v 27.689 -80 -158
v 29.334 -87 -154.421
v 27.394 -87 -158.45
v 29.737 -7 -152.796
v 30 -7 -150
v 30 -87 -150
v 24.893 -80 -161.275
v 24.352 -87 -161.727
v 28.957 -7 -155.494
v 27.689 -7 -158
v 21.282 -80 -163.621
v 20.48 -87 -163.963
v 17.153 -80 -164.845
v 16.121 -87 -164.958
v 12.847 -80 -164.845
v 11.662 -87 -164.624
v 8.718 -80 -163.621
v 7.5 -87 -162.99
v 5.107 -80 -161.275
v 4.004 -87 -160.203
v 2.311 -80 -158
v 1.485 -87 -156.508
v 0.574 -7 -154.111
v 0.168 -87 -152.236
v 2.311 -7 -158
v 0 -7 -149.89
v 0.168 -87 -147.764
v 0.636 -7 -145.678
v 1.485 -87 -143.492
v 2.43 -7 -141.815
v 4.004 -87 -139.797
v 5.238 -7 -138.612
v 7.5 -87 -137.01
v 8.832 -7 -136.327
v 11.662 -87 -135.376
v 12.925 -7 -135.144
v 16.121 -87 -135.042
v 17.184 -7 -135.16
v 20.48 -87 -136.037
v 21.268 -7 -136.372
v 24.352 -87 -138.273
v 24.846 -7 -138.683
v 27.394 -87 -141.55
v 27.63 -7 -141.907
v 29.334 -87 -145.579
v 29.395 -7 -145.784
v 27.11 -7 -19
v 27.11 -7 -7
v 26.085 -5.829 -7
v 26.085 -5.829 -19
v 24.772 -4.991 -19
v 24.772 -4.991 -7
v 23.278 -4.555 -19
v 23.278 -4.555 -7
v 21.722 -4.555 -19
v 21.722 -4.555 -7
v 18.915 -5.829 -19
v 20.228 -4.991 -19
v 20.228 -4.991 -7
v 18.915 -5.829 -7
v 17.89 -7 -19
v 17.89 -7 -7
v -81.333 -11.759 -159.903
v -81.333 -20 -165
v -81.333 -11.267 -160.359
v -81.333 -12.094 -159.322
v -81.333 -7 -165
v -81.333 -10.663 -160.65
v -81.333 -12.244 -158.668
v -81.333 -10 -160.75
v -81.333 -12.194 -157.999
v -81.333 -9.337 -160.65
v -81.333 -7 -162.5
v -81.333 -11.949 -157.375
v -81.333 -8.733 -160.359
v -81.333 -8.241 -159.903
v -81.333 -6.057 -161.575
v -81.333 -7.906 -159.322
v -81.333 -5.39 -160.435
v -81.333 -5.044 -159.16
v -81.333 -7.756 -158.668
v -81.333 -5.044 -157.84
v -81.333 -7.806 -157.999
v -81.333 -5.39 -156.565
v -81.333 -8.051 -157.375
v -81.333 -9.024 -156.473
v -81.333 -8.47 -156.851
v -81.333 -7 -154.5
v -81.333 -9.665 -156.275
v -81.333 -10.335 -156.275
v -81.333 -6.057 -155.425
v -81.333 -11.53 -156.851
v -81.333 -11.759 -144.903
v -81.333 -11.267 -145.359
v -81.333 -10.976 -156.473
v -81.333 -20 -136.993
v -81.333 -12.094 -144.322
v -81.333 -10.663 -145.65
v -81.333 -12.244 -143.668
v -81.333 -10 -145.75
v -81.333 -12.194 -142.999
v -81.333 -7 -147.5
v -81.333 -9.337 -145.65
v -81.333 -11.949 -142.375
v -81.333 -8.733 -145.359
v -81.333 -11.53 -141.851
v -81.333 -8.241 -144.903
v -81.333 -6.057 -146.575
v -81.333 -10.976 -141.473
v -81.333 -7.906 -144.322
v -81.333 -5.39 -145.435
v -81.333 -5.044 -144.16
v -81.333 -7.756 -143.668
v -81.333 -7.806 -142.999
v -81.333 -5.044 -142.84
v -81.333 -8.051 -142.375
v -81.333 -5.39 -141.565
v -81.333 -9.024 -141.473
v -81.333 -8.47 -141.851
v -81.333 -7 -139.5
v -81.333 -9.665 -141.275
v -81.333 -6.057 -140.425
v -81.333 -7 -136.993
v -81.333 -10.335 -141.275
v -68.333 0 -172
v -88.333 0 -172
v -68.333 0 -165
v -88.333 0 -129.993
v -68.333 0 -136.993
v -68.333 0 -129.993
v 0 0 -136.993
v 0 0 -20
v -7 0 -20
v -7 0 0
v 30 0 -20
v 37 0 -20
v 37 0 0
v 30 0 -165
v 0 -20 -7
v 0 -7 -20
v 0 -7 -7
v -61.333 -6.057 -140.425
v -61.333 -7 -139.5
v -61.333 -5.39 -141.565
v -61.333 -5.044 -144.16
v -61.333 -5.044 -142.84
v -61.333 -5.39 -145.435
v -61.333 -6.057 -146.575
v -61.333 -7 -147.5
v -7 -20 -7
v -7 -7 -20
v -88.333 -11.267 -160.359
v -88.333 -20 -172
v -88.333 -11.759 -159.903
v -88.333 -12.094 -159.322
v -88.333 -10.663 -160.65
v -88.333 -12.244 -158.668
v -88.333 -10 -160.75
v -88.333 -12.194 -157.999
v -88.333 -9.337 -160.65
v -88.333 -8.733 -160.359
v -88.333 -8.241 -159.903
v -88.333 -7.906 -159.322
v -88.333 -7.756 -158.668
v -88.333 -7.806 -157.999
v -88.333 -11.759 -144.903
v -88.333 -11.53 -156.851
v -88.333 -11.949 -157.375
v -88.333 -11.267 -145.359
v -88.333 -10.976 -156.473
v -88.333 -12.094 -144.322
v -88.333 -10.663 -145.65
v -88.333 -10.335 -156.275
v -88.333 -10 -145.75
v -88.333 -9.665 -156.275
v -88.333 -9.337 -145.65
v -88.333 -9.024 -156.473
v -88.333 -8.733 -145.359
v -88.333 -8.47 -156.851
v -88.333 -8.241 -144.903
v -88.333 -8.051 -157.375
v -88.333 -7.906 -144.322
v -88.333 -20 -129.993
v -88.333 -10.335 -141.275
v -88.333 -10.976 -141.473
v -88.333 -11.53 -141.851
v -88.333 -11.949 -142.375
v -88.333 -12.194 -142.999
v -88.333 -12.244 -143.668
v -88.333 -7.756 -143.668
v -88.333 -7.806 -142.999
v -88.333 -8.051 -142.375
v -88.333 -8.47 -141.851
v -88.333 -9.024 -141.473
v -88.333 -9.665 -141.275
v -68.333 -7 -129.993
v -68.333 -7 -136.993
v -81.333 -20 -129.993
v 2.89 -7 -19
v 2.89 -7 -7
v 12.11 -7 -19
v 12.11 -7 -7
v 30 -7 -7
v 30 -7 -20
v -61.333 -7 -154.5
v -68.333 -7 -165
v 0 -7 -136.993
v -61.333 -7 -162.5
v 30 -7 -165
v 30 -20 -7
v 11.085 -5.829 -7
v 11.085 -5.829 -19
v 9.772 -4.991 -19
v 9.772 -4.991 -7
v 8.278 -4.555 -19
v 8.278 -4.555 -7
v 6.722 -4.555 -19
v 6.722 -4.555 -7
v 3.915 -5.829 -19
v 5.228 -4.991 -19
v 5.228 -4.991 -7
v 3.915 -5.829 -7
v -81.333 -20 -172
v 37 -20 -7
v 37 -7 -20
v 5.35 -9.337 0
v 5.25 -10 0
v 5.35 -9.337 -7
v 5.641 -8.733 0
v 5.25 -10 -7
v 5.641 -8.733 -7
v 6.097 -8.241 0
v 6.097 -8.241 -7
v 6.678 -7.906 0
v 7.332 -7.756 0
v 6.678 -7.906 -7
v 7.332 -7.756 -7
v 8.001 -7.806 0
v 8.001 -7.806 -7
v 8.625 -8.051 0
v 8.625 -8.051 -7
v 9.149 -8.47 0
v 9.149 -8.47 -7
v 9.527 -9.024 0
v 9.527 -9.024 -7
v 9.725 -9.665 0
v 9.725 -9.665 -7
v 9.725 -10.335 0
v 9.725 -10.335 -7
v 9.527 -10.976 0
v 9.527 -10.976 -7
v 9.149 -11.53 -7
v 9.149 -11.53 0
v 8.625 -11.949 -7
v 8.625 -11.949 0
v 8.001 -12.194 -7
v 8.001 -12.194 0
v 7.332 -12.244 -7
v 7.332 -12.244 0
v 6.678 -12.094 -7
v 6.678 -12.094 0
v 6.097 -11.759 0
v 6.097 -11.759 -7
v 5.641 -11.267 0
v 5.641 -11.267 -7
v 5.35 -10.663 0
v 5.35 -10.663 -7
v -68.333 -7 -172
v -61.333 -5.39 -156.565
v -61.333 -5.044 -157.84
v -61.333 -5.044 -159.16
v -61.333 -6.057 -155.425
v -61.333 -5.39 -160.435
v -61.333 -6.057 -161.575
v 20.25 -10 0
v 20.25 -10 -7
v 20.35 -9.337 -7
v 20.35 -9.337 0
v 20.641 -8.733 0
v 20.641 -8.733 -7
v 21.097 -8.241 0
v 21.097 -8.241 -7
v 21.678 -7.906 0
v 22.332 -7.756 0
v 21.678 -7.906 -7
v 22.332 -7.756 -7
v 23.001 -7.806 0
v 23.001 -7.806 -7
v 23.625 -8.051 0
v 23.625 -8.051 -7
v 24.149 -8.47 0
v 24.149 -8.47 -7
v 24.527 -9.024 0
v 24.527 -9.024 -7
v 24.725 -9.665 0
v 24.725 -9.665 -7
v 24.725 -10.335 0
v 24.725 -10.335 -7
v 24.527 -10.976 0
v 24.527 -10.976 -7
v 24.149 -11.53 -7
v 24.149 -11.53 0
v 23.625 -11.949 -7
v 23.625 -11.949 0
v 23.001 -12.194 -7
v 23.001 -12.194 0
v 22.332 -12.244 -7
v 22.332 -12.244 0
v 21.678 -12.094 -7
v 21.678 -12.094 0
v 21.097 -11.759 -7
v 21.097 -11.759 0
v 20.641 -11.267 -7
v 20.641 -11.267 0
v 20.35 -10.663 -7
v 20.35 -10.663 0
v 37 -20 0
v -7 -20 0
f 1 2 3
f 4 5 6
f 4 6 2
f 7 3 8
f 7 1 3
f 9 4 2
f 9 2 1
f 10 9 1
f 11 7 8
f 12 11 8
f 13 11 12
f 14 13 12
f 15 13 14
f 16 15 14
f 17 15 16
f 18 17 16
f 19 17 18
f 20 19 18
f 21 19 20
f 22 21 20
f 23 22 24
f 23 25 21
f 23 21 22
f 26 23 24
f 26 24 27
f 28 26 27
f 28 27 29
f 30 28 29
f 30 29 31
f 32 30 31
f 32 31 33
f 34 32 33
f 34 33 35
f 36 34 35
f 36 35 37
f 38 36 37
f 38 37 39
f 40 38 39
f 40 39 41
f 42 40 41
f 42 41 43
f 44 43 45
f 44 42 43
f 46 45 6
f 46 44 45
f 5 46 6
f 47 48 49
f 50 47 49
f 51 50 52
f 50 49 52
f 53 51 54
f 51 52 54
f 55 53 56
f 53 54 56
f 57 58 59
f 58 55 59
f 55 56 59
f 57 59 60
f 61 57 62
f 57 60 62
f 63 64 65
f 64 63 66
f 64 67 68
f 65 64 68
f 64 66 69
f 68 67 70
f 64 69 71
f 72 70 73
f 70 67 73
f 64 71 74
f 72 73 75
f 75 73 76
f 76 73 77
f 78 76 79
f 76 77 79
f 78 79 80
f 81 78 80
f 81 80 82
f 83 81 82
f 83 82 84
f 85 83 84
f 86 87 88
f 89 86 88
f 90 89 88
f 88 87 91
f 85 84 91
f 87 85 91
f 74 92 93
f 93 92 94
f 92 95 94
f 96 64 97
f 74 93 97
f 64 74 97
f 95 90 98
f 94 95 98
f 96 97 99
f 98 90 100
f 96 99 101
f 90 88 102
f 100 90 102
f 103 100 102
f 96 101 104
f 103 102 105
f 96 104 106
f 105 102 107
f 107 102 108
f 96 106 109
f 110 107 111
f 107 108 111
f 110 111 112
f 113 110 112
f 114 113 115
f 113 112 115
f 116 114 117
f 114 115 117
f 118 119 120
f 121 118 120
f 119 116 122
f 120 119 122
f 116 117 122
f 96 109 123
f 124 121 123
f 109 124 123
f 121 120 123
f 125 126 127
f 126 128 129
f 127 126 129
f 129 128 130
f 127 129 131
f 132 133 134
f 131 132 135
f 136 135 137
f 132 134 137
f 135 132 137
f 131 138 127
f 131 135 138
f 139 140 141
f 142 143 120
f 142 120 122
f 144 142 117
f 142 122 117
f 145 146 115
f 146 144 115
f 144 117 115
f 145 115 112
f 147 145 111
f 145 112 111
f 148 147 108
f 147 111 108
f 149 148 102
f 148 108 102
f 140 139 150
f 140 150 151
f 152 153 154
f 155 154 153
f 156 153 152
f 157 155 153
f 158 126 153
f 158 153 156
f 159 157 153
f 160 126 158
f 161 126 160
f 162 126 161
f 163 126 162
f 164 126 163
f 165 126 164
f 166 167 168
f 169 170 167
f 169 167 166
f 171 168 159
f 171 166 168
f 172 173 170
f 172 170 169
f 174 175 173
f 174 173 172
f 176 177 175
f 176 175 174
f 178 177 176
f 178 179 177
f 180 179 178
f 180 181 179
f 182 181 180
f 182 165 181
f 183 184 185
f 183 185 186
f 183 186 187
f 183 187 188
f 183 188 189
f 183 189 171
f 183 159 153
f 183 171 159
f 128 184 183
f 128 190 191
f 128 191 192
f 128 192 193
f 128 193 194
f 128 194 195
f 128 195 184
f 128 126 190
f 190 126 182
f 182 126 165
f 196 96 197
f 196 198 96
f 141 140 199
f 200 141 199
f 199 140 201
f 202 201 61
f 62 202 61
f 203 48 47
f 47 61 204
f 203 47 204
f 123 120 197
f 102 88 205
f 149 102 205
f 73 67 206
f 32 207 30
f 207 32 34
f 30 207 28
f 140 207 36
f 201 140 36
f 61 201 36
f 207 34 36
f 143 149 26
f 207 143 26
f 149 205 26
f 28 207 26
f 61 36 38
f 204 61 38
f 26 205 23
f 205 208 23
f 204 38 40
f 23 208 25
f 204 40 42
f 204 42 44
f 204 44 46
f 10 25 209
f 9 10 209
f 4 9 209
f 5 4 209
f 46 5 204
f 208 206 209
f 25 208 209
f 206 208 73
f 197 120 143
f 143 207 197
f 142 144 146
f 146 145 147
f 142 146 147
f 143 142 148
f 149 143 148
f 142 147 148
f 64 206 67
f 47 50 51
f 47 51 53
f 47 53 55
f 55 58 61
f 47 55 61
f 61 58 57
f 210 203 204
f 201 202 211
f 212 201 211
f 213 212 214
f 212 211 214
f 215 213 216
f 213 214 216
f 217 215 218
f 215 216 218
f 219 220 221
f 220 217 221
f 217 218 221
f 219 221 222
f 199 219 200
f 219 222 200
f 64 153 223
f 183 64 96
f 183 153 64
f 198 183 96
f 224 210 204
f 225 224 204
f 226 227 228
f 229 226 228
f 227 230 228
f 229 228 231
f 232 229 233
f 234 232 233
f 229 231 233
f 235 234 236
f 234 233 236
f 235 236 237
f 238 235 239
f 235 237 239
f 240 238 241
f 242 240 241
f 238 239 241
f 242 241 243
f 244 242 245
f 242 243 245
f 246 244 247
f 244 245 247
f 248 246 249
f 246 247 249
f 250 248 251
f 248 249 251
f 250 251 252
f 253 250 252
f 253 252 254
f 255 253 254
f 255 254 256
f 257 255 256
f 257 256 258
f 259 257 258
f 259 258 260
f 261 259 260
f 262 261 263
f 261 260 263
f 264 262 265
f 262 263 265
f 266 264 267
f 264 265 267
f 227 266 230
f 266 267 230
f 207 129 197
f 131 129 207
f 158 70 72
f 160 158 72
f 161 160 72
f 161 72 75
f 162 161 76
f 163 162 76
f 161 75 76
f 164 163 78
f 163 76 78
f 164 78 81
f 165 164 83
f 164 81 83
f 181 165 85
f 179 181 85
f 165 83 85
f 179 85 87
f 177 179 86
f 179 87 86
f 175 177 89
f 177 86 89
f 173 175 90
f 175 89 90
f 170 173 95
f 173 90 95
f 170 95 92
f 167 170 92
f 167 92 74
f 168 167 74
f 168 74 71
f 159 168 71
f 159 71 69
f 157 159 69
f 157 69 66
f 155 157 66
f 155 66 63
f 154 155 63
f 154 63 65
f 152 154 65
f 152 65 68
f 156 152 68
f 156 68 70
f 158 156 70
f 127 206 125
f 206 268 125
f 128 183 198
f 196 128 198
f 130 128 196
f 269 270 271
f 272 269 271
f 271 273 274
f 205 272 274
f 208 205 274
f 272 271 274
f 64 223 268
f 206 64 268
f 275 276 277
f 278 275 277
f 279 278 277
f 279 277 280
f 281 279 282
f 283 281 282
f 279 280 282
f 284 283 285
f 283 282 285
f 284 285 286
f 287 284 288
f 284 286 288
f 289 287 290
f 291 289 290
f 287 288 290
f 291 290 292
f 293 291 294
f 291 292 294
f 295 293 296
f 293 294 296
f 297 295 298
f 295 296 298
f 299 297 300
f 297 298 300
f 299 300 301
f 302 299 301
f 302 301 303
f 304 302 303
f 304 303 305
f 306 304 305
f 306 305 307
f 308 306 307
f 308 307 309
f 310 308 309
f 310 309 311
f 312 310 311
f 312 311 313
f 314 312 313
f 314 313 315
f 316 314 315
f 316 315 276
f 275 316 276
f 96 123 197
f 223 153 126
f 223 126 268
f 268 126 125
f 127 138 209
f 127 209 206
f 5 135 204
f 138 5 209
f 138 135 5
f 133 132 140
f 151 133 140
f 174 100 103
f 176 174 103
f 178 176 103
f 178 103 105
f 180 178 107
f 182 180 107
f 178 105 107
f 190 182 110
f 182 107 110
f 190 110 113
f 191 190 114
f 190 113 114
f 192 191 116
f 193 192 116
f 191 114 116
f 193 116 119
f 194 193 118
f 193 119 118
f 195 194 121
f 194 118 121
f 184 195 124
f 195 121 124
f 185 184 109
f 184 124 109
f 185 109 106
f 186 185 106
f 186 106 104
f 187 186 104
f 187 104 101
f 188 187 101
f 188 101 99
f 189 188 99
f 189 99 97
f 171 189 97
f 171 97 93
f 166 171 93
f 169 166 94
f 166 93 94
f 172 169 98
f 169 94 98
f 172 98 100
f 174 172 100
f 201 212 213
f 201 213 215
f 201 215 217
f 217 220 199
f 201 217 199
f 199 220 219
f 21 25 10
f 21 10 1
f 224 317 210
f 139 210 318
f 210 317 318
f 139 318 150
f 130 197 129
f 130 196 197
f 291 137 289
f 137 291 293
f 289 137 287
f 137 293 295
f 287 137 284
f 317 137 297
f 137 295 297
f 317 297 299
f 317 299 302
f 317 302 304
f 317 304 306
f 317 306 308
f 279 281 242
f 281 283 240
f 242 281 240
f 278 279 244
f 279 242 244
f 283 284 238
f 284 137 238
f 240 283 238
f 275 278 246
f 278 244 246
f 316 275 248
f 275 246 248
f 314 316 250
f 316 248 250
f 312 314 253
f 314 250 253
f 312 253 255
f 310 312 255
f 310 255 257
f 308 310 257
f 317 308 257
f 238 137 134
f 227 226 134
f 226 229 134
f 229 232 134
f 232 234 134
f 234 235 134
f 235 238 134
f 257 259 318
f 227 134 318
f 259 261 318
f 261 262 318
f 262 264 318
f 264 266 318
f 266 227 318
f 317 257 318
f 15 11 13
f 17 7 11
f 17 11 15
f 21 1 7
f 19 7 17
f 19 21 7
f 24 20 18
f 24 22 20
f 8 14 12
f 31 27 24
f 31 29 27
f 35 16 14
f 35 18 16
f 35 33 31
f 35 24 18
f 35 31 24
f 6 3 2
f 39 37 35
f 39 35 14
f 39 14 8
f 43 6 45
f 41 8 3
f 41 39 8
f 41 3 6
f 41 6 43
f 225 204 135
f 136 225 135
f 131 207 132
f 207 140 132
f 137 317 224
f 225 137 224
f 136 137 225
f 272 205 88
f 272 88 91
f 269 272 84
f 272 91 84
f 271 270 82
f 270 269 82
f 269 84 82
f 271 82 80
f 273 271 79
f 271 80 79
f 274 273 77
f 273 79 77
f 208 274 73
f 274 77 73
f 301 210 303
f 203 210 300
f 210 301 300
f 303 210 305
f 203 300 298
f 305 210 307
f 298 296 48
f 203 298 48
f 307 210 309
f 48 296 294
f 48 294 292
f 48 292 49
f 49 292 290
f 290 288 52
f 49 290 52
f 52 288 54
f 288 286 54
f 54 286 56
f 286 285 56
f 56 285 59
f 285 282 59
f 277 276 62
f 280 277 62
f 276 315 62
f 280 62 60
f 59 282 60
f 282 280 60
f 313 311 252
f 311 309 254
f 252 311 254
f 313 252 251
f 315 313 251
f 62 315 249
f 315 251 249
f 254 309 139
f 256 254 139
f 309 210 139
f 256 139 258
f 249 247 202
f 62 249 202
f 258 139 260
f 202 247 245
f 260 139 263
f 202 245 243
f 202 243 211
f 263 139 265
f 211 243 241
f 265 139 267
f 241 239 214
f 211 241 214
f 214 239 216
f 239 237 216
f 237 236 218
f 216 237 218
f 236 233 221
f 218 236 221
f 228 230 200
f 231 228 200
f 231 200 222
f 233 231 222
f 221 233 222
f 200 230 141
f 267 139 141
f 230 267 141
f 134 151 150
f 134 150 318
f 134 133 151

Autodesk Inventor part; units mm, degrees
ref_plane "YZ Plane" through (0, 0, 0) normal (1, 0, 0) x (0, 1, 0)
ref_plane "XZ Plane" through (0, 0, 0) normal (0, 1, 0) x (-1, 0, 0)
ref_plane "XY Plane" through (0, 0, 0) normal (0, 0, 1) x (1, 0, 0)
sketch "Sketch1" plane through (0, 0, 0) normal (1, 0, 0) x (0, 1, 0)
  line L0 (0, 0) -> (-20, 0)
  line L1 (-20, 0) -> (-20, -7)
  line L2 (-20, -7) -> (0, -7)
  line L3 (0, -7) -> (0, 0)
  line L4 (0, -7) -> (-7, -7)
  line L5 (-7, -7) -> (-7, -150)
  line L6 (-7, -150) -> (0, -150)
  line L7 (0, -150) -> (0, -7)
  dimension "d0" = 7
  dimension "d1" = 20
  dimension "d2" = 7
  dimension "d3" = 150
extrude "Extrusion1" add sketch "Sketch1" along normal blind 30
sketch "Sketch2" plane through (0, -7, -150) normal (0, -1, 0) x (1, 0, 0)
  line L0 (0, 0) -> (30, 0) projected
  circle A0 centre (15, 0) radius 15
  point P0 (0, 150)
extrude "Extrusion2" add sketch "Sketch2" along normal blind 80 and the other way blind 7
sketch "Sketch3" plane through (0, -20, -7) normal (0, 0, -1) x (-1, 0, 0)
  circle A0 centre (-7.5, 10) radius 2.25
  circle A1 centre (-22.5, 10) radius 2.25
  line L0 (0, 0) -> (-30, 0) projected
  line L1 (-30, 0) -> (-30, 13) projected
  point P0 (0, 20)
  dimension "d10" = 10
  dimension "d11" = 4.5
  dimension "d12" = 4.5
  dimension "d13" = 10
  dimension "d14" = 15
  dimension "d15" = 7.5
sketch "Sketch4" plane through (30, 0, 0) normal (1, 0, 0) x (0, 0, -1)
  line L0 (150, 0) -> (0, 0) projected
  line L1 (0, 0) -> (0, -20) projected
  line L2 (0, -20) -> (7, -20) projected
  line L3 (7, -20) -> (7, -7) projected
  line L4 (7, -7) -> (150, -7) projected
  line L5 (150, -7) -> (150, 0) projected
  line L6 (7, -20) -> (7, -7) projected
  line L7 (7, -20) -> (20, -7)
  line L8 (7, -7) -> (150, -7) projected
  line L9 (20, -7) -> (20, 0)
  dimension "d16" = 13
extrude "Extrusion3" add sketch "Sketch4" along normal blind 7 contours L9 L4 L3 L2 L1 L0 | L7 L3 L4
extrude "Extrusion4" cut sketch "Sketch3" against normal blind 7
sketch "Sketch5" plane through (0, 0, 0) normal (-1, 0, 0) x (0, 0, 1)
  line L0 (-150, 0) -> (0, 0) projected
  line L1 (-150, -7) -> (-150, 0) projected
  line L2 (-7, -7) -> (-150, -7) projected
  line L3 (-7, -20) -> (-7, -7) projected
  line L4 (0, -20) -> (-7, -20) projected
  line L5 (0, 0) -> (0, -20) projected
  line L6 (-7, -20) -> (-20, -7) projected
  line L7 (-7, -20) -> (-20, -7)
  line L8 (-20, 0) -> (-20, -7) projected
  line L9 (-20, -7) -> (-20, 0)
extrude "Extrusion5" add sketch "Sketch5" along normal blind 7 contours L0 L5 L4 L3 L2 L8 | L2 L3 L6
sketch "Sketch6" plane through (30, -20, -7) normal (0, 0, -1) x (-1, 0, 0)
  circle A0 centre (7.5, 10) radius 2.25 projected
  circle A1 centre (22.5, 10) radius 2.25 projected
  circle A2 centre (7.5, 10) radius 5.5
  circle A3 centre (22.5, 10) radius 5.5
  point P0 (30, 20)
  dimension "d23" = 11
  dimension "d24" = 11
extrude "Extrusion6" cut sketch "Sketch6" along normal blind 12
sketch "Sketch7" plane through (0, 0, 0) normal (-1, 0, 0) x (0, 0, 1)
  line L0 (-193.0937, 8.1233) -> (-158, 8.1233)
  line L1 (-158, 8.1233) -> (-158, -80)
  line L2 (-158, -80) -> (-193.0937, -80)
  line L3 (-193.0937, -80) -> (-193.0937, 8.1233)
  line L4 (-150, 0) -> (-165, 0) projected
  point P0 (0, 0)
  dimension "d27" = 80
  dimension "d28" = 7
extrude "Extrusion7" cut sketch "Sketch7" against normal blind 72
sketch "Sketch8" plane through (30, 0, -20) normal (0, 1, 0) x (1, 0, 0)
  line L0 (0, 145) -> (-118.3328, 145)
  line L1 (-118.3328, 145) -> (-118.3328, 116.9928)
  line L2 (-118.3328, 116.9928) -> (0, 116.9928)
  line L3 (0, 116.9928) -> (0, 145)
  line L4 (0, 130) -> (0, 0) projected
  arc A0 (-2.3114, 138) -> (-27.6886, 138) centre (-15, 130) ccw projected
  line L5 (-138.3328, 520) -> (-138.3328, -40) projected
  point P0 (-30, -20)
  dimension "d31" = 0
  dimension "d32" = 15
  dimension "d33" = 20
extrude "Extrusion8" add sketch "Sketch8" against normal blind 7
sketch "Sketch9" plane through (30, -7, -150) normal (0, -1, 0) x (1, 0, 0)
  line L0 (-118.3328, -22) -> (-111.3328, -22)
  line L1 (-111.3328, -22) -> (-111.3328, 20.0072)
  line L2 (-111.3328, 20.0072) -> (-118.3328, 20.0072)
  line L3 (-118.3328, 20.0072) -> (-118.3328, -22)
  line L4 (-118.3328, 13.0072) -> (-118.3328, -15) projected
  line L5 (-30, 13.0072) -> (-118.3328, 13.0072) projected
  line L6 (-118.3328, -15) -> (0, -15) projected
  point P0 (-30, 150)
  dimension "d36" = 7
  dimension "d37" = 0
  dimension "d38" = 7
  dimension "d39" = 7
extrude "Extrusion9" add sketch "Sketch9" along normal blind 13 and the other way blind 7
sketch "Sketch10" plane through (-81.3328, -20, -172) normal (0, 0, -1) x (-1, 0, 0)
  line L0 (7, 0) -> (0, 0) projected
  line L1 (0, 0) -> (-20, 20)
  line L2 (0, 20) -> (-81.3328, 20) projected
  line L3 (0, 20) -> (0, 0) projected
  line L4 (0, 13) -> (-111.3328, 13) projected
  line L5 (-13, 13) -> (-13, 20)
  dimension "d44" = 45
extrude "Extrusion10" add sketch "Sketch10" against normal blind 7 contours L1 L4 L3 | L5 L2 L3 L4
sketch "Sketch11" plane through (-88.3328, -20, -129.9928) normal (0, 0, 1) x (1, 0, 0)
  line L0 (7, 0) -> (7, 13) projected
  line L1 (20, 13) -> (27, 20) projected
  line L2 (7, 0) -> (20, 13)
  line L3 (20, 13) -> (20, 20)
  line L4 (0, 20) -> (20, 20) projected
  line L5 (7, 20) -> (7, 13)
  line L6 (7, 20) -> (7, 13) projected
  line L7 (7, 20) -> (20, 20)
  point P0 (88.3328, 20)
extrude "Extrusion11" add sketch "Sketch11" against normal blind 7
sketch "Sketch13" plane through (-81.3328, -20, -165) normal (1, 0, 0) x (0, 0, -1)
  circle A0 centre (-6.5, 10) radius 2.25
  circle A1 centre (-21.5, 10) radius 2.25
  line L0 (0, 0) -> (-28.0072, 0) projected
  line L1 (-158, 12.25) -> (-158, 7.75) projected
  line L2 (-158, 12.25) -> (-158, 7.75) projected
  line L3 (0, 0) -> (0, 13) projected
  line L4 (-28.0072, 13) -> (-28.0072, 0) projected
  point P0 (-165, 20)
  dimension "d49" = 10
  dimension "d50" = 10
  dimension "d51" = 15
  dimension "d52" = 6.5
  dimension "d53" = 6.5072
  dimension "d54" = 4.5
  dimension "d55" = 4.5
extrude "Extrusion12" cut sketch "Sketch13" against normal blind 7
sketch "Sketch15" plane through (-81.3328, -20, -165) normal (1, 0, 0) x (0, 0, -1)
  circle A0 centre (-6.5, 10) radius 2.25 projected
  circle A1 centre (-6.5, 10) radius 5
  circle A2 centre (-21.5, 10) radius 2.25 projected
  circle A3 centre (-21.5, 10) radius 5
  point P0 (-165, 20)
  dimension "d58" = 10
  dimension "d59" = 10
extrude "Extrusion13" cut sketch "Sketch15" along normal blind 20 contours A1 | A2 | A3
equation "\"d12\" = d11"
equation "\"d13\" = d10"
properties part number "SpoolHolder"
